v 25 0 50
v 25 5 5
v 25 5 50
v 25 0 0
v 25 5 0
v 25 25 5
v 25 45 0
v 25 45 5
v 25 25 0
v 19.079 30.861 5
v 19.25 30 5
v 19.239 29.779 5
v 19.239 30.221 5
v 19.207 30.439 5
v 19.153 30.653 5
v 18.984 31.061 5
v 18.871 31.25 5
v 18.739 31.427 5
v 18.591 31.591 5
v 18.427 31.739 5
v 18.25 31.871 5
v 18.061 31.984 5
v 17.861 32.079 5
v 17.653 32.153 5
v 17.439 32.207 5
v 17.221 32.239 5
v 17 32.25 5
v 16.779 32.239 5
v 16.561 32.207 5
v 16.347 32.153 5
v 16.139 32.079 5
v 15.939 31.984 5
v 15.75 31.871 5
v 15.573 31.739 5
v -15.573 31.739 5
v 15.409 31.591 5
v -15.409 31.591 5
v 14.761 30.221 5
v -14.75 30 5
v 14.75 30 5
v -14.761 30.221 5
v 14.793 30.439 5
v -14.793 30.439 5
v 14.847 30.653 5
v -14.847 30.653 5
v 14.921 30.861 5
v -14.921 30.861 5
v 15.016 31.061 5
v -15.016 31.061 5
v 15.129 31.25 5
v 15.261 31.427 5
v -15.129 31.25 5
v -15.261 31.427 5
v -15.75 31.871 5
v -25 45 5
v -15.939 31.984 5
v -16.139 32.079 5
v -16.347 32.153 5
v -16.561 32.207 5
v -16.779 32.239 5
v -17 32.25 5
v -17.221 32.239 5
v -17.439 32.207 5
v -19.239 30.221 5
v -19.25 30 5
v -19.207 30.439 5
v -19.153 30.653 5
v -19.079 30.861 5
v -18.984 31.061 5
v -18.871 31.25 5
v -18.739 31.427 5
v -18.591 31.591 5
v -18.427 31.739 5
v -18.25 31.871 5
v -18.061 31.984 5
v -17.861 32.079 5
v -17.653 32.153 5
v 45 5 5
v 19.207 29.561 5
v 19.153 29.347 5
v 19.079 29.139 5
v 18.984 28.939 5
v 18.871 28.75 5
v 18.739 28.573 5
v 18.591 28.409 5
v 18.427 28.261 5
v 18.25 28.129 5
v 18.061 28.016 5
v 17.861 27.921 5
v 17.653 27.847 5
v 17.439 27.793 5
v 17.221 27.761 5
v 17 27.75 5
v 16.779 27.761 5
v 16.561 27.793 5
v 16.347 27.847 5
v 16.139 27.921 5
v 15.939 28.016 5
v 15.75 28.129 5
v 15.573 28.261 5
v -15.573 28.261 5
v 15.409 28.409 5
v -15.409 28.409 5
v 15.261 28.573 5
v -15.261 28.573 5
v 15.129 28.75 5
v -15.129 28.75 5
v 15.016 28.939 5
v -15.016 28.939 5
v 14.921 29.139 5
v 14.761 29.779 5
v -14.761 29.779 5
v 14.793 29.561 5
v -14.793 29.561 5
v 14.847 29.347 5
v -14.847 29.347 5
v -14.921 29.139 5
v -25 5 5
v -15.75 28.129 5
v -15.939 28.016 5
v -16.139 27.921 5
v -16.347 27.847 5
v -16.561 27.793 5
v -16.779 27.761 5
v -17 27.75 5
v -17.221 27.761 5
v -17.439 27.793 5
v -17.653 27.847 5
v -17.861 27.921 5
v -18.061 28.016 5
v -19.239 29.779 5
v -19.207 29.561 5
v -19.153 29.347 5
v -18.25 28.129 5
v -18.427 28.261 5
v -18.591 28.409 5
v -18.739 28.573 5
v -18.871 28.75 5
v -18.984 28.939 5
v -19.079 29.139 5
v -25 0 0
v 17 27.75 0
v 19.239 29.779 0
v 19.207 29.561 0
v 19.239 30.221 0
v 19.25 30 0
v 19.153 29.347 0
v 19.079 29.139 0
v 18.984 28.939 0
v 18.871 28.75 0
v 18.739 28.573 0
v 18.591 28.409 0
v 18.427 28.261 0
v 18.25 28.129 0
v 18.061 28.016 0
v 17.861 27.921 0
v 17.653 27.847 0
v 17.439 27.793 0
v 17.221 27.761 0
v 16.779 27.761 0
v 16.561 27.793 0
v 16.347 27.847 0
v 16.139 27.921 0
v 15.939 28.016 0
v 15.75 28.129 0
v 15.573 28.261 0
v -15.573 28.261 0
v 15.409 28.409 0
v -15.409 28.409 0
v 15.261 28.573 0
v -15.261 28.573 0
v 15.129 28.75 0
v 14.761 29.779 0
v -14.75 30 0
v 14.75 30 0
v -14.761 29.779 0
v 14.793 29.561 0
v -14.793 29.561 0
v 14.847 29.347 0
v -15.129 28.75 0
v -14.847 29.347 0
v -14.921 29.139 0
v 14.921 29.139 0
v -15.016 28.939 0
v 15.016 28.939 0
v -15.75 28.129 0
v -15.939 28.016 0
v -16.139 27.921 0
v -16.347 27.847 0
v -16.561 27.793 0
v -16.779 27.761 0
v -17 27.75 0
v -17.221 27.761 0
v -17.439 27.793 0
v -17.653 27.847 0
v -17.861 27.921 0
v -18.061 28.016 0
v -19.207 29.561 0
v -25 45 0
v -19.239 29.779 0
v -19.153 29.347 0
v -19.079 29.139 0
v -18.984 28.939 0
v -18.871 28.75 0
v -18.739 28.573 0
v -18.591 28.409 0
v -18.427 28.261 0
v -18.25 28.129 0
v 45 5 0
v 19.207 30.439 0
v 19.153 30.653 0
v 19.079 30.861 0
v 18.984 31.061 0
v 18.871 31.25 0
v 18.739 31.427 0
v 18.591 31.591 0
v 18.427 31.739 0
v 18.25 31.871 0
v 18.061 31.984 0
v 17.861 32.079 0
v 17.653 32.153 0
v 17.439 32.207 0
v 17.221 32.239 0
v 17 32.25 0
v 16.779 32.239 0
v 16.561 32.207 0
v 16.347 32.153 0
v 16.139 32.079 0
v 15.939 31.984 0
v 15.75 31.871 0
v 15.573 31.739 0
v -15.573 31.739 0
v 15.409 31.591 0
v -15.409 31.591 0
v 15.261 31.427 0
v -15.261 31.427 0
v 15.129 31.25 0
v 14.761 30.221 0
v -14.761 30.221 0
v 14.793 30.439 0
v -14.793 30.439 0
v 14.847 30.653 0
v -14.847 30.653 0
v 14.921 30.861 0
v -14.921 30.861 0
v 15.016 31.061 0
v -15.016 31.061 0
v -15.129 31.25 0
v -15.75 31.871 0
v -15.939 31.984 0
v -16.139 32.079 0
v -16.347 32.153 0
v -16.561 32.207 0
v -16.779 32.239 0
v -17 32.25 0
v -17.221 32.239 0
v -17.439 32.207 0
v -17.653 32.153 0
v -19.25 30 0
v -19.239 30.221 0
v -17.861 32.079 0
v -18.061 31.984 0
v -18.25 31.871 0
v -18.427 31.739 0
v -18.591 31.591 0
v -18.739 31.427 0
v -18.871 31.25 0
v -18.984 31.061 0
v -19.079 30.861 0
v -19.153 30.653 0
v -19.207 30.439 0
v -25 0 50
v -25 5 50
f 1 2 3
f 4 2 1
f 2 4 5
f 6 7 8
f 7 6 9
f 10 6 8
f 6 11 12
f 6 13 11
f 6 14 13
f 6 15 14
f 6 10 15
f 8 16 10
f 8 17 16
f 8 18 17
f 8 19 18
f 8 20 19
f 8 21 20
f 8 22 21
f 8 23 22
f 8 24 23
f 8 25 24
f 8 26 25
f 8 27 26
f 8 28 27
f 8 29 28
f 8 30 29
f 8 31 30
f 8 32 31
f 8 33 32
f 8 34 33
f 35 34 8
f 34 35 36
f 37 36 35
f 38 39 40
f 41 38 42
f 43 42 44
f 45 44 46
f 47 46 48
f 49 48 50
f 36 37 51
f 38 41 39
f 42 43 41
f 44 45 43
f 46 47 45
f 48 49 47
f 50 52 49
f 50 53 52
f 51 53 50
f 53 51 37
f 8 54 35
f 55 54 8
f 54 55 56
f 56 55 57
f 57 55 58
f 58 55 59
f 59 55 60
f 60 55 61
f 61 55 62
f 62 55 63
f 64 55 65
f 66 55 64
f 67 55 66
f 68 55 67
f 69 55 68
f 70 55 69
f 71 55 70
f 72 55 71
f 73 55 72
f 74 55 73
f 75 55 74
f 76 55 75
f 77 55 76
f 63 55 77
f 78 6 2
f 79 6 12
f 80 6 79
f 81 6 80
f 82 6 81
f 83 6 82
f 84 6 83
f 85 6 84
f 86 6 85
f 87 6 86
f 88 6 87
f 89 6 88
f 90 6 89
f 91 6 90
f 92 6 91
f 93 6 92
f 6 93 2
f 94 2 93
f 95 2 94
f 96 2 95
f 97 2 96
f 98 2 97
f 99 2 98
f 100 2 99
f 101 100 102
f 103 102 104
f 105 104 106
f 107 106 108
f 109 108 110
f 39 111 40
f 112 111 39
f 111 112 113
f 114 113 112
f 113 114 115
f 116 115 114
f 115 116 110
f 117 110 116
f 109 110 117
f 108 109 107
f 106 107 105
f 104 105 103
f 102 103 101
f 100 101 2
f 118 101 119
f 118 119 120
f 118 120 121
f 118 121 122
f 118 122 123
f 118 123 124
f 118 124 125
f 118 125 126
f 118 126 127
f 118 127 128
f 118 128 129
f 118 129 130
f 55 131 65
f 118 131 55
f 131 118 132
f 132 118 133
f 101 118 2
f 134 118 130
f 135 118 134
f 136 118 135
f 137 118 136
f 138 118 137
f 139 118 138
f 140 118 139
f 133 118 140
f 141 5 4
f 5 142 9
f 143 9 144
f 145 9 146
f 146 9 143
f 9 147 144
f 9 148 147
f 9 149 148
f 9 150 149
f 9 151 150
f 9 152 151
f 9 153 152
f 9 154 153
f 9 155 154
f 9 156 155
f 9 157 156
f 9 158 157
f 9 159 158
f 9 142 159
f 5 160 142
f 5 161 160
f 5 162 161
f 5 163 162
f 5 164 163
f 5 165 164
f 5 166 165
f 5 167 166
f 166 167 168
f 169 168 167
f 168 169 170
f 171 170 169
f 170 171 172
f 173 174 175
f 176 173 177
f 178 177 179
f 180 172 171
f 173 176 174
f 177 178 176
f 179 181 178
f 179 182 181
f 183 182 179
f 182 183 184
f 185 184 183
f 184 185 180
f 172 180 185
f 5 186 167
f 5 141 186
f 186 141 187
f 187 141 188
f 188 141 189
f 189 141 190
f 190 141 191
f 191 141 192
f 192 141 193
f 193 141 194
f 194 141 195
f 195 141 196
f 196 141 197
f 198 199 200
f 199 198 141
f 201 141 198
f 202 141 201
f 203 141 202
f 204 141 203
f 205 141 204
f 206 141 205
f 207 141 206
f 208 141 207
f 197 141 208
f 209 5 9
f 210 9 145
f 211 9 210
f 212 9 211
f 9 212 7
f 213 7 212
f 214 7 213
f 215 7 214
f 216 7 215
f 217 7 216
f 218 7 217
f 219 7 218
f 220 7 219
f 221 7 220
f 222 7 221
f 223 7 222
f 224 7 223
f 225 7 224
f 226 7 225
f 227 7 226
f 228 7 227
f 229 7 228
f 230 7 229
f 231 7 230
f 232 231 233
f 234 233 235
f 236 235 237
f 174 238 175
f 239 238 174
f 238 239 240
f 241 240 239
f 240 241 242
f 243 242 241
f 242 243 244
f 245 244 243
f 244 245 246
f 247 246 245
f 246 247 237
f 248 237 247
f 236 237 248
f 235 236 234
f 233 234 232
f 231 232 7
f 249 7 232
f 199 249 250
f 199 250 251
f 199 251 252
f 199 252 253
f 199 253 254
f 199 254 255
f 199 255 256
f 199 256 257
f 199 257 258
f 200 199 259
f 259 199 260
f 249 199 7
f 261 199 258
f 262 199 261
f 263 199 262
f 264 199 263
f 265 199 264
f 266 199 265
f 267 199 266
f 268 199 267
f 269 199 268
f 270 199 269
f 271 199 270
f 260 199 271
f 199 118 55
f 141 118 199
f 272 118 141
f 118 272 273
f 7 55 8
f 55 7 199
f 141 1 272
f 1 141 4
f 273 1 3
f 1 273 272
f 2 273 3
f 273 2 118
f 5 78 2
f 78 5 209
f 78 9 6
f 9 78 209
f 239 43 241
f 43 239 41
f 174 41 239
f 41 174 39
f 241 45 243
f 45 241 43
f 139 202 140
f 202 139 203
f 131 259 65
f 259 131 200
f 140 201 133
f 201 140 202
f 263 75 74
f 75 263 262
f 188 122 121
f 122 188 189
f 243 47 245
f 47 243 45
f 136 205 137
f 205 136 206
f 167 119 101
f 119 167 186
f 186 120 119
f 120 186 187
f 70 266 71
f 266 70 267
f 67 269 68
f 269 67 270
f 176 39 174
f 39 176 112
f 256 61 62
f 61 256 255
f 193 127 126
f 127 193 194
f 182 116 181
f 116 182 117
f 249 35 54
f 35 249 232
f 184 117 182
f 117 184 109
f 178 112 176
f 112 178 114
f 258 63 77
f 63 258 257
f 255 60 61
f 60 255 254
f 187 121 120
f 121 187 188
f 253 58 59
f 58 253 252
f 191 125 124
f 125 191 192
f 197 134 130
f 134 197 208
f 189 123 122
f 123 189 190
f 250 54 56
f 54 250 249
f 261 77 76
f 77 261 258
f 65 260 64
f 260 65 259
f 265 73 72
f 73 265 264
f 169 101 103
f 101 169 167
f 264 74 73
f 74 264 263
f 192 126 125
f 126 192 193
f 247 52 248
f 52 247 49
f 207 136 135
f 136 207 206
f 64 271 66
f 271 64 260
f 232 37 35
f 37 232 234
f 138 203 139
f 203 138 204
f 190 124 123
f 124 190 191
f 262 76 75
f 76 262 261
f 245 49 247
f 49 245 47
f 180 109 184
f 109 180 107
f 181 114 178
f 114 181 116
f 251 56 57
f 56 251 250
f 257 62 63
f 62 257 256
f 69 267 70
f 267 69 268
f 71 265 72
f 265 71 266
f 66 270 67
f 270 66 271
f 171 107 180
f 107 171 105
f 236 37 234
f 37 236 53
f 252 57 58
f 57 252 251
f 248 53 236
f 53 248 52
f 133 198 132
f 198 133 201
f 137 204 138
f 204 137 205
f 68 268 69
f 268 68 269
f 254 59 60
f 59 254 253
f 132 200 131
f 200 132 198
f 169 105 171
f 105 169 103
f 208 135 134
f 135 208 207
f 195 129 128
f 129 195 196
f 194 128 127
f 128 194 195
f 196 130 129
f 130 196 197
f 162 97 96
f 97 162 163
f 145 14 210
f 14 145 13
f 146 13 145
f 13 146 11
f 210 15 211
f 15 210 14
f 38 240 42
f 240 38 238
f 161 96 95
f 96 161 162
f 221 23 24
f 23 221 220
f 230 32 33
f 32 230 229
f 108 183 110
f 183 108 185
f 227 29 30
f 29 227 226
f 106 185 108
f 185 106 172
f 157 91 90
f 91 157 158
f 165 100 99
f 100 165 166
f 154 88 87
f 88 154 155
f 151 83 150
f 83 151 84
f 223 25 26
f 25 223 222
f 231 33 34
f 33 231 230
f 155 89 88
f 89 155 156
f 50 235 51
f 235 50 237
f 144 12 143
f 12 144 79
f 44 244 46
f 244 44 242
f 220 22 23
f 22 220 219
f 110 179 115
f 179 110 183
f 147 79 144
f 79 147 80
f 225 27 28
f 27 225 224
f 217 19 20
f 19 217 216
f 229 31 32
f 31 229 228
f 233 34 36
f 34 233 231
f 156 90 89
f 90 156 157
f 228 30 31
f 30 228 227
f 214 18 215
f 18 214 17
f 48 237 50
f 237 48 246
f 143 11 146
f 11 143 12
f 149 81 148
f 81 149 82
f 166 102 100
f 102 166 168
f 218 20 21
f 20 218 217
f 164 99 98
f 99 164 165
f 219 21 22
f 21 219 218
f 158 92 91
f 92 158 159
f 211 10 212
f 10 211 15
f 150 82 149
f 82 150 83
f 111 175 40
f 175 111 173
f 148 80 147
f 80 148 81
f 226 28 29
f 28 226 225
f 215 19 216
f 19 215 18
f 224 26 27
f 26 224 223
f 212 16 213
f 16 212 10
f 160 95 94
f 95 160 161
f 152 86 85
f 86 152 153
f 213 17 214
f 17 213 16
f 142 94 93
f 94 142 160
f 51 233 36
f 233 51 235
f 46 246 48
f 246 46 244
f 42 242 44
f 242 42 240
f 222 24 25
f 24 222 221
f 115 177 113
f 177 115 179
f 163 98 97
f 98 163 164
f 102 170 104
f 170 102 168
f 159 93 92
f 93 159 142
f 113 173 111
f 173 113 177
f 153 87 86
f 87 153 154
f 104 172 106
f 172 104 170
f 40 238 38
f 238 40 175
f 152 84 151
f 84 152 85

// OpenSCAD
// NEMA 17 L-shaped mounting bracket
// Print orientation: base plate on XY plane (z=0), builds upward (+Z)

$fn = 64;

// Base plate dimensions
base_x_min = -25;
base_x_max = 25;
base_y_min = 0;
base_y_max = 45;
base_z_min = 0;
base_z_max = 5;

// M4 through-holes in base plate
m4_hole_d = 4.5;
m4_hole_x1 = -17;
m4_hole_y1 = 30;
m4_hole_x2 = 17;
m4_hole_y2 = 30;

// Vertical motor plate dimensions
motor_x_min = -25;
motor_x_max = 25;
motor_y_min = 0;
motor_y_max = 5;
motor_z_min = 0;
motor_z_max = 50;

// Motor centring boss hole
boss_hole_d = 23;
boss_hole_x = 0;
boss_hole_z = 28;

// M3 screw holes on 31 mm square pattern
m3_hole_d = 3.4;
m3_square = 31;
m3_offset = m3_square / 2;  // 15.5 mm from centre

// Gusset dimensions
gusset_thick = 5;
gusset_leg_y = 20;
gusset_leg_z = 20;
gusset_y_corner = 5;   // right-angle corner y position
gusset_z_corner = 5;   // right-angle corner z position

// Left gusset x range
gusset_left_x_min = -25;
gusset_left_x_max = -20;

// Right gusset x range
gusset_right_x_min = 20;
gusset_right_x_max = 25;

// Helper: triangular gusset in YZ plane, extruded along X
// Right angle at (y_corner, z_corner), legs along +Y and +Z
module gusset(x_min, x_max) {
    linear_extrude(x_max - x_min) {
        polygon(points = [
            [gusset_y_corner, gusset_z_corner],
            [gusset_y_corner + gusset_leg_y, gusset_z_corner],
            [gusset_y_corner, gusset_z_corner + gusset_leg_z]
        ]);
    }
}

// Helper: vertical through-hole in motor plate (along Y axis)
module motor_plate_hole(cx, cz, d) {
    translate([cx, -1, cz]) {
        rotate([90, 0, 0]) {
            cylinder(h = motor_y_max - motor_y_min + 2, d = d, $fn = $fn);
        }
    }
}

// Helper: vertical through-hole in base plate (along Z axis)
module base_plate_hole(cx, cy, d) {
    translate([cx, cy, -1]) {
        cylinder(h = base_z_max - base_z_min + 2, d = d, $fn = $fn);
    }
}

difference() {
    union() {
        // Base plate
        translate([base_x_min, base_y_min, base_z_min]) {
            cube([base_x_max - base_x_min, base_y_max - base_y_min, base_z_max - base_z_min]);
        }

        // Vertical motor plate
        translate([motor_x_min, motor_y_min, motor_z_min]) {
            cube([motor_x_max - motor_x_min, motor_y_max - motor_y_min, motor_z_max - motor_z_min]);
        }

        // Left gusset
        translate([gusset_left_x_min, 0, 0]) {
            gusset(0, gusset_thick);
        }

        // Right gusset
        translate([gusset_right_x_min, 0, 0]) {
            gusset(0, gusset_thick);
        }
    }

    // M4 holes in base plate
    base_plate_hole(m4_hole_x1, m4_hole_y1, m4_hole_d);
    base_plate_hole(m4_hole_x2, m4_hole_y2, m4_hole_d);

    // Boss hole in motor plate
    motor_plate_hole(boss_hole_x, boss_hole_z, boss_hole_d);

    // M3 screw holes in motor plate (31 mm square pattern)
    for (dx = [-m3_offset, m3_offset]) {
        for (dz = [-m3_offset, m3_offset]) {
            motor_plate_hole(boss_hole_x + dx, boss_hole_z + dz, m3_hole_d);
        }
    }
}
